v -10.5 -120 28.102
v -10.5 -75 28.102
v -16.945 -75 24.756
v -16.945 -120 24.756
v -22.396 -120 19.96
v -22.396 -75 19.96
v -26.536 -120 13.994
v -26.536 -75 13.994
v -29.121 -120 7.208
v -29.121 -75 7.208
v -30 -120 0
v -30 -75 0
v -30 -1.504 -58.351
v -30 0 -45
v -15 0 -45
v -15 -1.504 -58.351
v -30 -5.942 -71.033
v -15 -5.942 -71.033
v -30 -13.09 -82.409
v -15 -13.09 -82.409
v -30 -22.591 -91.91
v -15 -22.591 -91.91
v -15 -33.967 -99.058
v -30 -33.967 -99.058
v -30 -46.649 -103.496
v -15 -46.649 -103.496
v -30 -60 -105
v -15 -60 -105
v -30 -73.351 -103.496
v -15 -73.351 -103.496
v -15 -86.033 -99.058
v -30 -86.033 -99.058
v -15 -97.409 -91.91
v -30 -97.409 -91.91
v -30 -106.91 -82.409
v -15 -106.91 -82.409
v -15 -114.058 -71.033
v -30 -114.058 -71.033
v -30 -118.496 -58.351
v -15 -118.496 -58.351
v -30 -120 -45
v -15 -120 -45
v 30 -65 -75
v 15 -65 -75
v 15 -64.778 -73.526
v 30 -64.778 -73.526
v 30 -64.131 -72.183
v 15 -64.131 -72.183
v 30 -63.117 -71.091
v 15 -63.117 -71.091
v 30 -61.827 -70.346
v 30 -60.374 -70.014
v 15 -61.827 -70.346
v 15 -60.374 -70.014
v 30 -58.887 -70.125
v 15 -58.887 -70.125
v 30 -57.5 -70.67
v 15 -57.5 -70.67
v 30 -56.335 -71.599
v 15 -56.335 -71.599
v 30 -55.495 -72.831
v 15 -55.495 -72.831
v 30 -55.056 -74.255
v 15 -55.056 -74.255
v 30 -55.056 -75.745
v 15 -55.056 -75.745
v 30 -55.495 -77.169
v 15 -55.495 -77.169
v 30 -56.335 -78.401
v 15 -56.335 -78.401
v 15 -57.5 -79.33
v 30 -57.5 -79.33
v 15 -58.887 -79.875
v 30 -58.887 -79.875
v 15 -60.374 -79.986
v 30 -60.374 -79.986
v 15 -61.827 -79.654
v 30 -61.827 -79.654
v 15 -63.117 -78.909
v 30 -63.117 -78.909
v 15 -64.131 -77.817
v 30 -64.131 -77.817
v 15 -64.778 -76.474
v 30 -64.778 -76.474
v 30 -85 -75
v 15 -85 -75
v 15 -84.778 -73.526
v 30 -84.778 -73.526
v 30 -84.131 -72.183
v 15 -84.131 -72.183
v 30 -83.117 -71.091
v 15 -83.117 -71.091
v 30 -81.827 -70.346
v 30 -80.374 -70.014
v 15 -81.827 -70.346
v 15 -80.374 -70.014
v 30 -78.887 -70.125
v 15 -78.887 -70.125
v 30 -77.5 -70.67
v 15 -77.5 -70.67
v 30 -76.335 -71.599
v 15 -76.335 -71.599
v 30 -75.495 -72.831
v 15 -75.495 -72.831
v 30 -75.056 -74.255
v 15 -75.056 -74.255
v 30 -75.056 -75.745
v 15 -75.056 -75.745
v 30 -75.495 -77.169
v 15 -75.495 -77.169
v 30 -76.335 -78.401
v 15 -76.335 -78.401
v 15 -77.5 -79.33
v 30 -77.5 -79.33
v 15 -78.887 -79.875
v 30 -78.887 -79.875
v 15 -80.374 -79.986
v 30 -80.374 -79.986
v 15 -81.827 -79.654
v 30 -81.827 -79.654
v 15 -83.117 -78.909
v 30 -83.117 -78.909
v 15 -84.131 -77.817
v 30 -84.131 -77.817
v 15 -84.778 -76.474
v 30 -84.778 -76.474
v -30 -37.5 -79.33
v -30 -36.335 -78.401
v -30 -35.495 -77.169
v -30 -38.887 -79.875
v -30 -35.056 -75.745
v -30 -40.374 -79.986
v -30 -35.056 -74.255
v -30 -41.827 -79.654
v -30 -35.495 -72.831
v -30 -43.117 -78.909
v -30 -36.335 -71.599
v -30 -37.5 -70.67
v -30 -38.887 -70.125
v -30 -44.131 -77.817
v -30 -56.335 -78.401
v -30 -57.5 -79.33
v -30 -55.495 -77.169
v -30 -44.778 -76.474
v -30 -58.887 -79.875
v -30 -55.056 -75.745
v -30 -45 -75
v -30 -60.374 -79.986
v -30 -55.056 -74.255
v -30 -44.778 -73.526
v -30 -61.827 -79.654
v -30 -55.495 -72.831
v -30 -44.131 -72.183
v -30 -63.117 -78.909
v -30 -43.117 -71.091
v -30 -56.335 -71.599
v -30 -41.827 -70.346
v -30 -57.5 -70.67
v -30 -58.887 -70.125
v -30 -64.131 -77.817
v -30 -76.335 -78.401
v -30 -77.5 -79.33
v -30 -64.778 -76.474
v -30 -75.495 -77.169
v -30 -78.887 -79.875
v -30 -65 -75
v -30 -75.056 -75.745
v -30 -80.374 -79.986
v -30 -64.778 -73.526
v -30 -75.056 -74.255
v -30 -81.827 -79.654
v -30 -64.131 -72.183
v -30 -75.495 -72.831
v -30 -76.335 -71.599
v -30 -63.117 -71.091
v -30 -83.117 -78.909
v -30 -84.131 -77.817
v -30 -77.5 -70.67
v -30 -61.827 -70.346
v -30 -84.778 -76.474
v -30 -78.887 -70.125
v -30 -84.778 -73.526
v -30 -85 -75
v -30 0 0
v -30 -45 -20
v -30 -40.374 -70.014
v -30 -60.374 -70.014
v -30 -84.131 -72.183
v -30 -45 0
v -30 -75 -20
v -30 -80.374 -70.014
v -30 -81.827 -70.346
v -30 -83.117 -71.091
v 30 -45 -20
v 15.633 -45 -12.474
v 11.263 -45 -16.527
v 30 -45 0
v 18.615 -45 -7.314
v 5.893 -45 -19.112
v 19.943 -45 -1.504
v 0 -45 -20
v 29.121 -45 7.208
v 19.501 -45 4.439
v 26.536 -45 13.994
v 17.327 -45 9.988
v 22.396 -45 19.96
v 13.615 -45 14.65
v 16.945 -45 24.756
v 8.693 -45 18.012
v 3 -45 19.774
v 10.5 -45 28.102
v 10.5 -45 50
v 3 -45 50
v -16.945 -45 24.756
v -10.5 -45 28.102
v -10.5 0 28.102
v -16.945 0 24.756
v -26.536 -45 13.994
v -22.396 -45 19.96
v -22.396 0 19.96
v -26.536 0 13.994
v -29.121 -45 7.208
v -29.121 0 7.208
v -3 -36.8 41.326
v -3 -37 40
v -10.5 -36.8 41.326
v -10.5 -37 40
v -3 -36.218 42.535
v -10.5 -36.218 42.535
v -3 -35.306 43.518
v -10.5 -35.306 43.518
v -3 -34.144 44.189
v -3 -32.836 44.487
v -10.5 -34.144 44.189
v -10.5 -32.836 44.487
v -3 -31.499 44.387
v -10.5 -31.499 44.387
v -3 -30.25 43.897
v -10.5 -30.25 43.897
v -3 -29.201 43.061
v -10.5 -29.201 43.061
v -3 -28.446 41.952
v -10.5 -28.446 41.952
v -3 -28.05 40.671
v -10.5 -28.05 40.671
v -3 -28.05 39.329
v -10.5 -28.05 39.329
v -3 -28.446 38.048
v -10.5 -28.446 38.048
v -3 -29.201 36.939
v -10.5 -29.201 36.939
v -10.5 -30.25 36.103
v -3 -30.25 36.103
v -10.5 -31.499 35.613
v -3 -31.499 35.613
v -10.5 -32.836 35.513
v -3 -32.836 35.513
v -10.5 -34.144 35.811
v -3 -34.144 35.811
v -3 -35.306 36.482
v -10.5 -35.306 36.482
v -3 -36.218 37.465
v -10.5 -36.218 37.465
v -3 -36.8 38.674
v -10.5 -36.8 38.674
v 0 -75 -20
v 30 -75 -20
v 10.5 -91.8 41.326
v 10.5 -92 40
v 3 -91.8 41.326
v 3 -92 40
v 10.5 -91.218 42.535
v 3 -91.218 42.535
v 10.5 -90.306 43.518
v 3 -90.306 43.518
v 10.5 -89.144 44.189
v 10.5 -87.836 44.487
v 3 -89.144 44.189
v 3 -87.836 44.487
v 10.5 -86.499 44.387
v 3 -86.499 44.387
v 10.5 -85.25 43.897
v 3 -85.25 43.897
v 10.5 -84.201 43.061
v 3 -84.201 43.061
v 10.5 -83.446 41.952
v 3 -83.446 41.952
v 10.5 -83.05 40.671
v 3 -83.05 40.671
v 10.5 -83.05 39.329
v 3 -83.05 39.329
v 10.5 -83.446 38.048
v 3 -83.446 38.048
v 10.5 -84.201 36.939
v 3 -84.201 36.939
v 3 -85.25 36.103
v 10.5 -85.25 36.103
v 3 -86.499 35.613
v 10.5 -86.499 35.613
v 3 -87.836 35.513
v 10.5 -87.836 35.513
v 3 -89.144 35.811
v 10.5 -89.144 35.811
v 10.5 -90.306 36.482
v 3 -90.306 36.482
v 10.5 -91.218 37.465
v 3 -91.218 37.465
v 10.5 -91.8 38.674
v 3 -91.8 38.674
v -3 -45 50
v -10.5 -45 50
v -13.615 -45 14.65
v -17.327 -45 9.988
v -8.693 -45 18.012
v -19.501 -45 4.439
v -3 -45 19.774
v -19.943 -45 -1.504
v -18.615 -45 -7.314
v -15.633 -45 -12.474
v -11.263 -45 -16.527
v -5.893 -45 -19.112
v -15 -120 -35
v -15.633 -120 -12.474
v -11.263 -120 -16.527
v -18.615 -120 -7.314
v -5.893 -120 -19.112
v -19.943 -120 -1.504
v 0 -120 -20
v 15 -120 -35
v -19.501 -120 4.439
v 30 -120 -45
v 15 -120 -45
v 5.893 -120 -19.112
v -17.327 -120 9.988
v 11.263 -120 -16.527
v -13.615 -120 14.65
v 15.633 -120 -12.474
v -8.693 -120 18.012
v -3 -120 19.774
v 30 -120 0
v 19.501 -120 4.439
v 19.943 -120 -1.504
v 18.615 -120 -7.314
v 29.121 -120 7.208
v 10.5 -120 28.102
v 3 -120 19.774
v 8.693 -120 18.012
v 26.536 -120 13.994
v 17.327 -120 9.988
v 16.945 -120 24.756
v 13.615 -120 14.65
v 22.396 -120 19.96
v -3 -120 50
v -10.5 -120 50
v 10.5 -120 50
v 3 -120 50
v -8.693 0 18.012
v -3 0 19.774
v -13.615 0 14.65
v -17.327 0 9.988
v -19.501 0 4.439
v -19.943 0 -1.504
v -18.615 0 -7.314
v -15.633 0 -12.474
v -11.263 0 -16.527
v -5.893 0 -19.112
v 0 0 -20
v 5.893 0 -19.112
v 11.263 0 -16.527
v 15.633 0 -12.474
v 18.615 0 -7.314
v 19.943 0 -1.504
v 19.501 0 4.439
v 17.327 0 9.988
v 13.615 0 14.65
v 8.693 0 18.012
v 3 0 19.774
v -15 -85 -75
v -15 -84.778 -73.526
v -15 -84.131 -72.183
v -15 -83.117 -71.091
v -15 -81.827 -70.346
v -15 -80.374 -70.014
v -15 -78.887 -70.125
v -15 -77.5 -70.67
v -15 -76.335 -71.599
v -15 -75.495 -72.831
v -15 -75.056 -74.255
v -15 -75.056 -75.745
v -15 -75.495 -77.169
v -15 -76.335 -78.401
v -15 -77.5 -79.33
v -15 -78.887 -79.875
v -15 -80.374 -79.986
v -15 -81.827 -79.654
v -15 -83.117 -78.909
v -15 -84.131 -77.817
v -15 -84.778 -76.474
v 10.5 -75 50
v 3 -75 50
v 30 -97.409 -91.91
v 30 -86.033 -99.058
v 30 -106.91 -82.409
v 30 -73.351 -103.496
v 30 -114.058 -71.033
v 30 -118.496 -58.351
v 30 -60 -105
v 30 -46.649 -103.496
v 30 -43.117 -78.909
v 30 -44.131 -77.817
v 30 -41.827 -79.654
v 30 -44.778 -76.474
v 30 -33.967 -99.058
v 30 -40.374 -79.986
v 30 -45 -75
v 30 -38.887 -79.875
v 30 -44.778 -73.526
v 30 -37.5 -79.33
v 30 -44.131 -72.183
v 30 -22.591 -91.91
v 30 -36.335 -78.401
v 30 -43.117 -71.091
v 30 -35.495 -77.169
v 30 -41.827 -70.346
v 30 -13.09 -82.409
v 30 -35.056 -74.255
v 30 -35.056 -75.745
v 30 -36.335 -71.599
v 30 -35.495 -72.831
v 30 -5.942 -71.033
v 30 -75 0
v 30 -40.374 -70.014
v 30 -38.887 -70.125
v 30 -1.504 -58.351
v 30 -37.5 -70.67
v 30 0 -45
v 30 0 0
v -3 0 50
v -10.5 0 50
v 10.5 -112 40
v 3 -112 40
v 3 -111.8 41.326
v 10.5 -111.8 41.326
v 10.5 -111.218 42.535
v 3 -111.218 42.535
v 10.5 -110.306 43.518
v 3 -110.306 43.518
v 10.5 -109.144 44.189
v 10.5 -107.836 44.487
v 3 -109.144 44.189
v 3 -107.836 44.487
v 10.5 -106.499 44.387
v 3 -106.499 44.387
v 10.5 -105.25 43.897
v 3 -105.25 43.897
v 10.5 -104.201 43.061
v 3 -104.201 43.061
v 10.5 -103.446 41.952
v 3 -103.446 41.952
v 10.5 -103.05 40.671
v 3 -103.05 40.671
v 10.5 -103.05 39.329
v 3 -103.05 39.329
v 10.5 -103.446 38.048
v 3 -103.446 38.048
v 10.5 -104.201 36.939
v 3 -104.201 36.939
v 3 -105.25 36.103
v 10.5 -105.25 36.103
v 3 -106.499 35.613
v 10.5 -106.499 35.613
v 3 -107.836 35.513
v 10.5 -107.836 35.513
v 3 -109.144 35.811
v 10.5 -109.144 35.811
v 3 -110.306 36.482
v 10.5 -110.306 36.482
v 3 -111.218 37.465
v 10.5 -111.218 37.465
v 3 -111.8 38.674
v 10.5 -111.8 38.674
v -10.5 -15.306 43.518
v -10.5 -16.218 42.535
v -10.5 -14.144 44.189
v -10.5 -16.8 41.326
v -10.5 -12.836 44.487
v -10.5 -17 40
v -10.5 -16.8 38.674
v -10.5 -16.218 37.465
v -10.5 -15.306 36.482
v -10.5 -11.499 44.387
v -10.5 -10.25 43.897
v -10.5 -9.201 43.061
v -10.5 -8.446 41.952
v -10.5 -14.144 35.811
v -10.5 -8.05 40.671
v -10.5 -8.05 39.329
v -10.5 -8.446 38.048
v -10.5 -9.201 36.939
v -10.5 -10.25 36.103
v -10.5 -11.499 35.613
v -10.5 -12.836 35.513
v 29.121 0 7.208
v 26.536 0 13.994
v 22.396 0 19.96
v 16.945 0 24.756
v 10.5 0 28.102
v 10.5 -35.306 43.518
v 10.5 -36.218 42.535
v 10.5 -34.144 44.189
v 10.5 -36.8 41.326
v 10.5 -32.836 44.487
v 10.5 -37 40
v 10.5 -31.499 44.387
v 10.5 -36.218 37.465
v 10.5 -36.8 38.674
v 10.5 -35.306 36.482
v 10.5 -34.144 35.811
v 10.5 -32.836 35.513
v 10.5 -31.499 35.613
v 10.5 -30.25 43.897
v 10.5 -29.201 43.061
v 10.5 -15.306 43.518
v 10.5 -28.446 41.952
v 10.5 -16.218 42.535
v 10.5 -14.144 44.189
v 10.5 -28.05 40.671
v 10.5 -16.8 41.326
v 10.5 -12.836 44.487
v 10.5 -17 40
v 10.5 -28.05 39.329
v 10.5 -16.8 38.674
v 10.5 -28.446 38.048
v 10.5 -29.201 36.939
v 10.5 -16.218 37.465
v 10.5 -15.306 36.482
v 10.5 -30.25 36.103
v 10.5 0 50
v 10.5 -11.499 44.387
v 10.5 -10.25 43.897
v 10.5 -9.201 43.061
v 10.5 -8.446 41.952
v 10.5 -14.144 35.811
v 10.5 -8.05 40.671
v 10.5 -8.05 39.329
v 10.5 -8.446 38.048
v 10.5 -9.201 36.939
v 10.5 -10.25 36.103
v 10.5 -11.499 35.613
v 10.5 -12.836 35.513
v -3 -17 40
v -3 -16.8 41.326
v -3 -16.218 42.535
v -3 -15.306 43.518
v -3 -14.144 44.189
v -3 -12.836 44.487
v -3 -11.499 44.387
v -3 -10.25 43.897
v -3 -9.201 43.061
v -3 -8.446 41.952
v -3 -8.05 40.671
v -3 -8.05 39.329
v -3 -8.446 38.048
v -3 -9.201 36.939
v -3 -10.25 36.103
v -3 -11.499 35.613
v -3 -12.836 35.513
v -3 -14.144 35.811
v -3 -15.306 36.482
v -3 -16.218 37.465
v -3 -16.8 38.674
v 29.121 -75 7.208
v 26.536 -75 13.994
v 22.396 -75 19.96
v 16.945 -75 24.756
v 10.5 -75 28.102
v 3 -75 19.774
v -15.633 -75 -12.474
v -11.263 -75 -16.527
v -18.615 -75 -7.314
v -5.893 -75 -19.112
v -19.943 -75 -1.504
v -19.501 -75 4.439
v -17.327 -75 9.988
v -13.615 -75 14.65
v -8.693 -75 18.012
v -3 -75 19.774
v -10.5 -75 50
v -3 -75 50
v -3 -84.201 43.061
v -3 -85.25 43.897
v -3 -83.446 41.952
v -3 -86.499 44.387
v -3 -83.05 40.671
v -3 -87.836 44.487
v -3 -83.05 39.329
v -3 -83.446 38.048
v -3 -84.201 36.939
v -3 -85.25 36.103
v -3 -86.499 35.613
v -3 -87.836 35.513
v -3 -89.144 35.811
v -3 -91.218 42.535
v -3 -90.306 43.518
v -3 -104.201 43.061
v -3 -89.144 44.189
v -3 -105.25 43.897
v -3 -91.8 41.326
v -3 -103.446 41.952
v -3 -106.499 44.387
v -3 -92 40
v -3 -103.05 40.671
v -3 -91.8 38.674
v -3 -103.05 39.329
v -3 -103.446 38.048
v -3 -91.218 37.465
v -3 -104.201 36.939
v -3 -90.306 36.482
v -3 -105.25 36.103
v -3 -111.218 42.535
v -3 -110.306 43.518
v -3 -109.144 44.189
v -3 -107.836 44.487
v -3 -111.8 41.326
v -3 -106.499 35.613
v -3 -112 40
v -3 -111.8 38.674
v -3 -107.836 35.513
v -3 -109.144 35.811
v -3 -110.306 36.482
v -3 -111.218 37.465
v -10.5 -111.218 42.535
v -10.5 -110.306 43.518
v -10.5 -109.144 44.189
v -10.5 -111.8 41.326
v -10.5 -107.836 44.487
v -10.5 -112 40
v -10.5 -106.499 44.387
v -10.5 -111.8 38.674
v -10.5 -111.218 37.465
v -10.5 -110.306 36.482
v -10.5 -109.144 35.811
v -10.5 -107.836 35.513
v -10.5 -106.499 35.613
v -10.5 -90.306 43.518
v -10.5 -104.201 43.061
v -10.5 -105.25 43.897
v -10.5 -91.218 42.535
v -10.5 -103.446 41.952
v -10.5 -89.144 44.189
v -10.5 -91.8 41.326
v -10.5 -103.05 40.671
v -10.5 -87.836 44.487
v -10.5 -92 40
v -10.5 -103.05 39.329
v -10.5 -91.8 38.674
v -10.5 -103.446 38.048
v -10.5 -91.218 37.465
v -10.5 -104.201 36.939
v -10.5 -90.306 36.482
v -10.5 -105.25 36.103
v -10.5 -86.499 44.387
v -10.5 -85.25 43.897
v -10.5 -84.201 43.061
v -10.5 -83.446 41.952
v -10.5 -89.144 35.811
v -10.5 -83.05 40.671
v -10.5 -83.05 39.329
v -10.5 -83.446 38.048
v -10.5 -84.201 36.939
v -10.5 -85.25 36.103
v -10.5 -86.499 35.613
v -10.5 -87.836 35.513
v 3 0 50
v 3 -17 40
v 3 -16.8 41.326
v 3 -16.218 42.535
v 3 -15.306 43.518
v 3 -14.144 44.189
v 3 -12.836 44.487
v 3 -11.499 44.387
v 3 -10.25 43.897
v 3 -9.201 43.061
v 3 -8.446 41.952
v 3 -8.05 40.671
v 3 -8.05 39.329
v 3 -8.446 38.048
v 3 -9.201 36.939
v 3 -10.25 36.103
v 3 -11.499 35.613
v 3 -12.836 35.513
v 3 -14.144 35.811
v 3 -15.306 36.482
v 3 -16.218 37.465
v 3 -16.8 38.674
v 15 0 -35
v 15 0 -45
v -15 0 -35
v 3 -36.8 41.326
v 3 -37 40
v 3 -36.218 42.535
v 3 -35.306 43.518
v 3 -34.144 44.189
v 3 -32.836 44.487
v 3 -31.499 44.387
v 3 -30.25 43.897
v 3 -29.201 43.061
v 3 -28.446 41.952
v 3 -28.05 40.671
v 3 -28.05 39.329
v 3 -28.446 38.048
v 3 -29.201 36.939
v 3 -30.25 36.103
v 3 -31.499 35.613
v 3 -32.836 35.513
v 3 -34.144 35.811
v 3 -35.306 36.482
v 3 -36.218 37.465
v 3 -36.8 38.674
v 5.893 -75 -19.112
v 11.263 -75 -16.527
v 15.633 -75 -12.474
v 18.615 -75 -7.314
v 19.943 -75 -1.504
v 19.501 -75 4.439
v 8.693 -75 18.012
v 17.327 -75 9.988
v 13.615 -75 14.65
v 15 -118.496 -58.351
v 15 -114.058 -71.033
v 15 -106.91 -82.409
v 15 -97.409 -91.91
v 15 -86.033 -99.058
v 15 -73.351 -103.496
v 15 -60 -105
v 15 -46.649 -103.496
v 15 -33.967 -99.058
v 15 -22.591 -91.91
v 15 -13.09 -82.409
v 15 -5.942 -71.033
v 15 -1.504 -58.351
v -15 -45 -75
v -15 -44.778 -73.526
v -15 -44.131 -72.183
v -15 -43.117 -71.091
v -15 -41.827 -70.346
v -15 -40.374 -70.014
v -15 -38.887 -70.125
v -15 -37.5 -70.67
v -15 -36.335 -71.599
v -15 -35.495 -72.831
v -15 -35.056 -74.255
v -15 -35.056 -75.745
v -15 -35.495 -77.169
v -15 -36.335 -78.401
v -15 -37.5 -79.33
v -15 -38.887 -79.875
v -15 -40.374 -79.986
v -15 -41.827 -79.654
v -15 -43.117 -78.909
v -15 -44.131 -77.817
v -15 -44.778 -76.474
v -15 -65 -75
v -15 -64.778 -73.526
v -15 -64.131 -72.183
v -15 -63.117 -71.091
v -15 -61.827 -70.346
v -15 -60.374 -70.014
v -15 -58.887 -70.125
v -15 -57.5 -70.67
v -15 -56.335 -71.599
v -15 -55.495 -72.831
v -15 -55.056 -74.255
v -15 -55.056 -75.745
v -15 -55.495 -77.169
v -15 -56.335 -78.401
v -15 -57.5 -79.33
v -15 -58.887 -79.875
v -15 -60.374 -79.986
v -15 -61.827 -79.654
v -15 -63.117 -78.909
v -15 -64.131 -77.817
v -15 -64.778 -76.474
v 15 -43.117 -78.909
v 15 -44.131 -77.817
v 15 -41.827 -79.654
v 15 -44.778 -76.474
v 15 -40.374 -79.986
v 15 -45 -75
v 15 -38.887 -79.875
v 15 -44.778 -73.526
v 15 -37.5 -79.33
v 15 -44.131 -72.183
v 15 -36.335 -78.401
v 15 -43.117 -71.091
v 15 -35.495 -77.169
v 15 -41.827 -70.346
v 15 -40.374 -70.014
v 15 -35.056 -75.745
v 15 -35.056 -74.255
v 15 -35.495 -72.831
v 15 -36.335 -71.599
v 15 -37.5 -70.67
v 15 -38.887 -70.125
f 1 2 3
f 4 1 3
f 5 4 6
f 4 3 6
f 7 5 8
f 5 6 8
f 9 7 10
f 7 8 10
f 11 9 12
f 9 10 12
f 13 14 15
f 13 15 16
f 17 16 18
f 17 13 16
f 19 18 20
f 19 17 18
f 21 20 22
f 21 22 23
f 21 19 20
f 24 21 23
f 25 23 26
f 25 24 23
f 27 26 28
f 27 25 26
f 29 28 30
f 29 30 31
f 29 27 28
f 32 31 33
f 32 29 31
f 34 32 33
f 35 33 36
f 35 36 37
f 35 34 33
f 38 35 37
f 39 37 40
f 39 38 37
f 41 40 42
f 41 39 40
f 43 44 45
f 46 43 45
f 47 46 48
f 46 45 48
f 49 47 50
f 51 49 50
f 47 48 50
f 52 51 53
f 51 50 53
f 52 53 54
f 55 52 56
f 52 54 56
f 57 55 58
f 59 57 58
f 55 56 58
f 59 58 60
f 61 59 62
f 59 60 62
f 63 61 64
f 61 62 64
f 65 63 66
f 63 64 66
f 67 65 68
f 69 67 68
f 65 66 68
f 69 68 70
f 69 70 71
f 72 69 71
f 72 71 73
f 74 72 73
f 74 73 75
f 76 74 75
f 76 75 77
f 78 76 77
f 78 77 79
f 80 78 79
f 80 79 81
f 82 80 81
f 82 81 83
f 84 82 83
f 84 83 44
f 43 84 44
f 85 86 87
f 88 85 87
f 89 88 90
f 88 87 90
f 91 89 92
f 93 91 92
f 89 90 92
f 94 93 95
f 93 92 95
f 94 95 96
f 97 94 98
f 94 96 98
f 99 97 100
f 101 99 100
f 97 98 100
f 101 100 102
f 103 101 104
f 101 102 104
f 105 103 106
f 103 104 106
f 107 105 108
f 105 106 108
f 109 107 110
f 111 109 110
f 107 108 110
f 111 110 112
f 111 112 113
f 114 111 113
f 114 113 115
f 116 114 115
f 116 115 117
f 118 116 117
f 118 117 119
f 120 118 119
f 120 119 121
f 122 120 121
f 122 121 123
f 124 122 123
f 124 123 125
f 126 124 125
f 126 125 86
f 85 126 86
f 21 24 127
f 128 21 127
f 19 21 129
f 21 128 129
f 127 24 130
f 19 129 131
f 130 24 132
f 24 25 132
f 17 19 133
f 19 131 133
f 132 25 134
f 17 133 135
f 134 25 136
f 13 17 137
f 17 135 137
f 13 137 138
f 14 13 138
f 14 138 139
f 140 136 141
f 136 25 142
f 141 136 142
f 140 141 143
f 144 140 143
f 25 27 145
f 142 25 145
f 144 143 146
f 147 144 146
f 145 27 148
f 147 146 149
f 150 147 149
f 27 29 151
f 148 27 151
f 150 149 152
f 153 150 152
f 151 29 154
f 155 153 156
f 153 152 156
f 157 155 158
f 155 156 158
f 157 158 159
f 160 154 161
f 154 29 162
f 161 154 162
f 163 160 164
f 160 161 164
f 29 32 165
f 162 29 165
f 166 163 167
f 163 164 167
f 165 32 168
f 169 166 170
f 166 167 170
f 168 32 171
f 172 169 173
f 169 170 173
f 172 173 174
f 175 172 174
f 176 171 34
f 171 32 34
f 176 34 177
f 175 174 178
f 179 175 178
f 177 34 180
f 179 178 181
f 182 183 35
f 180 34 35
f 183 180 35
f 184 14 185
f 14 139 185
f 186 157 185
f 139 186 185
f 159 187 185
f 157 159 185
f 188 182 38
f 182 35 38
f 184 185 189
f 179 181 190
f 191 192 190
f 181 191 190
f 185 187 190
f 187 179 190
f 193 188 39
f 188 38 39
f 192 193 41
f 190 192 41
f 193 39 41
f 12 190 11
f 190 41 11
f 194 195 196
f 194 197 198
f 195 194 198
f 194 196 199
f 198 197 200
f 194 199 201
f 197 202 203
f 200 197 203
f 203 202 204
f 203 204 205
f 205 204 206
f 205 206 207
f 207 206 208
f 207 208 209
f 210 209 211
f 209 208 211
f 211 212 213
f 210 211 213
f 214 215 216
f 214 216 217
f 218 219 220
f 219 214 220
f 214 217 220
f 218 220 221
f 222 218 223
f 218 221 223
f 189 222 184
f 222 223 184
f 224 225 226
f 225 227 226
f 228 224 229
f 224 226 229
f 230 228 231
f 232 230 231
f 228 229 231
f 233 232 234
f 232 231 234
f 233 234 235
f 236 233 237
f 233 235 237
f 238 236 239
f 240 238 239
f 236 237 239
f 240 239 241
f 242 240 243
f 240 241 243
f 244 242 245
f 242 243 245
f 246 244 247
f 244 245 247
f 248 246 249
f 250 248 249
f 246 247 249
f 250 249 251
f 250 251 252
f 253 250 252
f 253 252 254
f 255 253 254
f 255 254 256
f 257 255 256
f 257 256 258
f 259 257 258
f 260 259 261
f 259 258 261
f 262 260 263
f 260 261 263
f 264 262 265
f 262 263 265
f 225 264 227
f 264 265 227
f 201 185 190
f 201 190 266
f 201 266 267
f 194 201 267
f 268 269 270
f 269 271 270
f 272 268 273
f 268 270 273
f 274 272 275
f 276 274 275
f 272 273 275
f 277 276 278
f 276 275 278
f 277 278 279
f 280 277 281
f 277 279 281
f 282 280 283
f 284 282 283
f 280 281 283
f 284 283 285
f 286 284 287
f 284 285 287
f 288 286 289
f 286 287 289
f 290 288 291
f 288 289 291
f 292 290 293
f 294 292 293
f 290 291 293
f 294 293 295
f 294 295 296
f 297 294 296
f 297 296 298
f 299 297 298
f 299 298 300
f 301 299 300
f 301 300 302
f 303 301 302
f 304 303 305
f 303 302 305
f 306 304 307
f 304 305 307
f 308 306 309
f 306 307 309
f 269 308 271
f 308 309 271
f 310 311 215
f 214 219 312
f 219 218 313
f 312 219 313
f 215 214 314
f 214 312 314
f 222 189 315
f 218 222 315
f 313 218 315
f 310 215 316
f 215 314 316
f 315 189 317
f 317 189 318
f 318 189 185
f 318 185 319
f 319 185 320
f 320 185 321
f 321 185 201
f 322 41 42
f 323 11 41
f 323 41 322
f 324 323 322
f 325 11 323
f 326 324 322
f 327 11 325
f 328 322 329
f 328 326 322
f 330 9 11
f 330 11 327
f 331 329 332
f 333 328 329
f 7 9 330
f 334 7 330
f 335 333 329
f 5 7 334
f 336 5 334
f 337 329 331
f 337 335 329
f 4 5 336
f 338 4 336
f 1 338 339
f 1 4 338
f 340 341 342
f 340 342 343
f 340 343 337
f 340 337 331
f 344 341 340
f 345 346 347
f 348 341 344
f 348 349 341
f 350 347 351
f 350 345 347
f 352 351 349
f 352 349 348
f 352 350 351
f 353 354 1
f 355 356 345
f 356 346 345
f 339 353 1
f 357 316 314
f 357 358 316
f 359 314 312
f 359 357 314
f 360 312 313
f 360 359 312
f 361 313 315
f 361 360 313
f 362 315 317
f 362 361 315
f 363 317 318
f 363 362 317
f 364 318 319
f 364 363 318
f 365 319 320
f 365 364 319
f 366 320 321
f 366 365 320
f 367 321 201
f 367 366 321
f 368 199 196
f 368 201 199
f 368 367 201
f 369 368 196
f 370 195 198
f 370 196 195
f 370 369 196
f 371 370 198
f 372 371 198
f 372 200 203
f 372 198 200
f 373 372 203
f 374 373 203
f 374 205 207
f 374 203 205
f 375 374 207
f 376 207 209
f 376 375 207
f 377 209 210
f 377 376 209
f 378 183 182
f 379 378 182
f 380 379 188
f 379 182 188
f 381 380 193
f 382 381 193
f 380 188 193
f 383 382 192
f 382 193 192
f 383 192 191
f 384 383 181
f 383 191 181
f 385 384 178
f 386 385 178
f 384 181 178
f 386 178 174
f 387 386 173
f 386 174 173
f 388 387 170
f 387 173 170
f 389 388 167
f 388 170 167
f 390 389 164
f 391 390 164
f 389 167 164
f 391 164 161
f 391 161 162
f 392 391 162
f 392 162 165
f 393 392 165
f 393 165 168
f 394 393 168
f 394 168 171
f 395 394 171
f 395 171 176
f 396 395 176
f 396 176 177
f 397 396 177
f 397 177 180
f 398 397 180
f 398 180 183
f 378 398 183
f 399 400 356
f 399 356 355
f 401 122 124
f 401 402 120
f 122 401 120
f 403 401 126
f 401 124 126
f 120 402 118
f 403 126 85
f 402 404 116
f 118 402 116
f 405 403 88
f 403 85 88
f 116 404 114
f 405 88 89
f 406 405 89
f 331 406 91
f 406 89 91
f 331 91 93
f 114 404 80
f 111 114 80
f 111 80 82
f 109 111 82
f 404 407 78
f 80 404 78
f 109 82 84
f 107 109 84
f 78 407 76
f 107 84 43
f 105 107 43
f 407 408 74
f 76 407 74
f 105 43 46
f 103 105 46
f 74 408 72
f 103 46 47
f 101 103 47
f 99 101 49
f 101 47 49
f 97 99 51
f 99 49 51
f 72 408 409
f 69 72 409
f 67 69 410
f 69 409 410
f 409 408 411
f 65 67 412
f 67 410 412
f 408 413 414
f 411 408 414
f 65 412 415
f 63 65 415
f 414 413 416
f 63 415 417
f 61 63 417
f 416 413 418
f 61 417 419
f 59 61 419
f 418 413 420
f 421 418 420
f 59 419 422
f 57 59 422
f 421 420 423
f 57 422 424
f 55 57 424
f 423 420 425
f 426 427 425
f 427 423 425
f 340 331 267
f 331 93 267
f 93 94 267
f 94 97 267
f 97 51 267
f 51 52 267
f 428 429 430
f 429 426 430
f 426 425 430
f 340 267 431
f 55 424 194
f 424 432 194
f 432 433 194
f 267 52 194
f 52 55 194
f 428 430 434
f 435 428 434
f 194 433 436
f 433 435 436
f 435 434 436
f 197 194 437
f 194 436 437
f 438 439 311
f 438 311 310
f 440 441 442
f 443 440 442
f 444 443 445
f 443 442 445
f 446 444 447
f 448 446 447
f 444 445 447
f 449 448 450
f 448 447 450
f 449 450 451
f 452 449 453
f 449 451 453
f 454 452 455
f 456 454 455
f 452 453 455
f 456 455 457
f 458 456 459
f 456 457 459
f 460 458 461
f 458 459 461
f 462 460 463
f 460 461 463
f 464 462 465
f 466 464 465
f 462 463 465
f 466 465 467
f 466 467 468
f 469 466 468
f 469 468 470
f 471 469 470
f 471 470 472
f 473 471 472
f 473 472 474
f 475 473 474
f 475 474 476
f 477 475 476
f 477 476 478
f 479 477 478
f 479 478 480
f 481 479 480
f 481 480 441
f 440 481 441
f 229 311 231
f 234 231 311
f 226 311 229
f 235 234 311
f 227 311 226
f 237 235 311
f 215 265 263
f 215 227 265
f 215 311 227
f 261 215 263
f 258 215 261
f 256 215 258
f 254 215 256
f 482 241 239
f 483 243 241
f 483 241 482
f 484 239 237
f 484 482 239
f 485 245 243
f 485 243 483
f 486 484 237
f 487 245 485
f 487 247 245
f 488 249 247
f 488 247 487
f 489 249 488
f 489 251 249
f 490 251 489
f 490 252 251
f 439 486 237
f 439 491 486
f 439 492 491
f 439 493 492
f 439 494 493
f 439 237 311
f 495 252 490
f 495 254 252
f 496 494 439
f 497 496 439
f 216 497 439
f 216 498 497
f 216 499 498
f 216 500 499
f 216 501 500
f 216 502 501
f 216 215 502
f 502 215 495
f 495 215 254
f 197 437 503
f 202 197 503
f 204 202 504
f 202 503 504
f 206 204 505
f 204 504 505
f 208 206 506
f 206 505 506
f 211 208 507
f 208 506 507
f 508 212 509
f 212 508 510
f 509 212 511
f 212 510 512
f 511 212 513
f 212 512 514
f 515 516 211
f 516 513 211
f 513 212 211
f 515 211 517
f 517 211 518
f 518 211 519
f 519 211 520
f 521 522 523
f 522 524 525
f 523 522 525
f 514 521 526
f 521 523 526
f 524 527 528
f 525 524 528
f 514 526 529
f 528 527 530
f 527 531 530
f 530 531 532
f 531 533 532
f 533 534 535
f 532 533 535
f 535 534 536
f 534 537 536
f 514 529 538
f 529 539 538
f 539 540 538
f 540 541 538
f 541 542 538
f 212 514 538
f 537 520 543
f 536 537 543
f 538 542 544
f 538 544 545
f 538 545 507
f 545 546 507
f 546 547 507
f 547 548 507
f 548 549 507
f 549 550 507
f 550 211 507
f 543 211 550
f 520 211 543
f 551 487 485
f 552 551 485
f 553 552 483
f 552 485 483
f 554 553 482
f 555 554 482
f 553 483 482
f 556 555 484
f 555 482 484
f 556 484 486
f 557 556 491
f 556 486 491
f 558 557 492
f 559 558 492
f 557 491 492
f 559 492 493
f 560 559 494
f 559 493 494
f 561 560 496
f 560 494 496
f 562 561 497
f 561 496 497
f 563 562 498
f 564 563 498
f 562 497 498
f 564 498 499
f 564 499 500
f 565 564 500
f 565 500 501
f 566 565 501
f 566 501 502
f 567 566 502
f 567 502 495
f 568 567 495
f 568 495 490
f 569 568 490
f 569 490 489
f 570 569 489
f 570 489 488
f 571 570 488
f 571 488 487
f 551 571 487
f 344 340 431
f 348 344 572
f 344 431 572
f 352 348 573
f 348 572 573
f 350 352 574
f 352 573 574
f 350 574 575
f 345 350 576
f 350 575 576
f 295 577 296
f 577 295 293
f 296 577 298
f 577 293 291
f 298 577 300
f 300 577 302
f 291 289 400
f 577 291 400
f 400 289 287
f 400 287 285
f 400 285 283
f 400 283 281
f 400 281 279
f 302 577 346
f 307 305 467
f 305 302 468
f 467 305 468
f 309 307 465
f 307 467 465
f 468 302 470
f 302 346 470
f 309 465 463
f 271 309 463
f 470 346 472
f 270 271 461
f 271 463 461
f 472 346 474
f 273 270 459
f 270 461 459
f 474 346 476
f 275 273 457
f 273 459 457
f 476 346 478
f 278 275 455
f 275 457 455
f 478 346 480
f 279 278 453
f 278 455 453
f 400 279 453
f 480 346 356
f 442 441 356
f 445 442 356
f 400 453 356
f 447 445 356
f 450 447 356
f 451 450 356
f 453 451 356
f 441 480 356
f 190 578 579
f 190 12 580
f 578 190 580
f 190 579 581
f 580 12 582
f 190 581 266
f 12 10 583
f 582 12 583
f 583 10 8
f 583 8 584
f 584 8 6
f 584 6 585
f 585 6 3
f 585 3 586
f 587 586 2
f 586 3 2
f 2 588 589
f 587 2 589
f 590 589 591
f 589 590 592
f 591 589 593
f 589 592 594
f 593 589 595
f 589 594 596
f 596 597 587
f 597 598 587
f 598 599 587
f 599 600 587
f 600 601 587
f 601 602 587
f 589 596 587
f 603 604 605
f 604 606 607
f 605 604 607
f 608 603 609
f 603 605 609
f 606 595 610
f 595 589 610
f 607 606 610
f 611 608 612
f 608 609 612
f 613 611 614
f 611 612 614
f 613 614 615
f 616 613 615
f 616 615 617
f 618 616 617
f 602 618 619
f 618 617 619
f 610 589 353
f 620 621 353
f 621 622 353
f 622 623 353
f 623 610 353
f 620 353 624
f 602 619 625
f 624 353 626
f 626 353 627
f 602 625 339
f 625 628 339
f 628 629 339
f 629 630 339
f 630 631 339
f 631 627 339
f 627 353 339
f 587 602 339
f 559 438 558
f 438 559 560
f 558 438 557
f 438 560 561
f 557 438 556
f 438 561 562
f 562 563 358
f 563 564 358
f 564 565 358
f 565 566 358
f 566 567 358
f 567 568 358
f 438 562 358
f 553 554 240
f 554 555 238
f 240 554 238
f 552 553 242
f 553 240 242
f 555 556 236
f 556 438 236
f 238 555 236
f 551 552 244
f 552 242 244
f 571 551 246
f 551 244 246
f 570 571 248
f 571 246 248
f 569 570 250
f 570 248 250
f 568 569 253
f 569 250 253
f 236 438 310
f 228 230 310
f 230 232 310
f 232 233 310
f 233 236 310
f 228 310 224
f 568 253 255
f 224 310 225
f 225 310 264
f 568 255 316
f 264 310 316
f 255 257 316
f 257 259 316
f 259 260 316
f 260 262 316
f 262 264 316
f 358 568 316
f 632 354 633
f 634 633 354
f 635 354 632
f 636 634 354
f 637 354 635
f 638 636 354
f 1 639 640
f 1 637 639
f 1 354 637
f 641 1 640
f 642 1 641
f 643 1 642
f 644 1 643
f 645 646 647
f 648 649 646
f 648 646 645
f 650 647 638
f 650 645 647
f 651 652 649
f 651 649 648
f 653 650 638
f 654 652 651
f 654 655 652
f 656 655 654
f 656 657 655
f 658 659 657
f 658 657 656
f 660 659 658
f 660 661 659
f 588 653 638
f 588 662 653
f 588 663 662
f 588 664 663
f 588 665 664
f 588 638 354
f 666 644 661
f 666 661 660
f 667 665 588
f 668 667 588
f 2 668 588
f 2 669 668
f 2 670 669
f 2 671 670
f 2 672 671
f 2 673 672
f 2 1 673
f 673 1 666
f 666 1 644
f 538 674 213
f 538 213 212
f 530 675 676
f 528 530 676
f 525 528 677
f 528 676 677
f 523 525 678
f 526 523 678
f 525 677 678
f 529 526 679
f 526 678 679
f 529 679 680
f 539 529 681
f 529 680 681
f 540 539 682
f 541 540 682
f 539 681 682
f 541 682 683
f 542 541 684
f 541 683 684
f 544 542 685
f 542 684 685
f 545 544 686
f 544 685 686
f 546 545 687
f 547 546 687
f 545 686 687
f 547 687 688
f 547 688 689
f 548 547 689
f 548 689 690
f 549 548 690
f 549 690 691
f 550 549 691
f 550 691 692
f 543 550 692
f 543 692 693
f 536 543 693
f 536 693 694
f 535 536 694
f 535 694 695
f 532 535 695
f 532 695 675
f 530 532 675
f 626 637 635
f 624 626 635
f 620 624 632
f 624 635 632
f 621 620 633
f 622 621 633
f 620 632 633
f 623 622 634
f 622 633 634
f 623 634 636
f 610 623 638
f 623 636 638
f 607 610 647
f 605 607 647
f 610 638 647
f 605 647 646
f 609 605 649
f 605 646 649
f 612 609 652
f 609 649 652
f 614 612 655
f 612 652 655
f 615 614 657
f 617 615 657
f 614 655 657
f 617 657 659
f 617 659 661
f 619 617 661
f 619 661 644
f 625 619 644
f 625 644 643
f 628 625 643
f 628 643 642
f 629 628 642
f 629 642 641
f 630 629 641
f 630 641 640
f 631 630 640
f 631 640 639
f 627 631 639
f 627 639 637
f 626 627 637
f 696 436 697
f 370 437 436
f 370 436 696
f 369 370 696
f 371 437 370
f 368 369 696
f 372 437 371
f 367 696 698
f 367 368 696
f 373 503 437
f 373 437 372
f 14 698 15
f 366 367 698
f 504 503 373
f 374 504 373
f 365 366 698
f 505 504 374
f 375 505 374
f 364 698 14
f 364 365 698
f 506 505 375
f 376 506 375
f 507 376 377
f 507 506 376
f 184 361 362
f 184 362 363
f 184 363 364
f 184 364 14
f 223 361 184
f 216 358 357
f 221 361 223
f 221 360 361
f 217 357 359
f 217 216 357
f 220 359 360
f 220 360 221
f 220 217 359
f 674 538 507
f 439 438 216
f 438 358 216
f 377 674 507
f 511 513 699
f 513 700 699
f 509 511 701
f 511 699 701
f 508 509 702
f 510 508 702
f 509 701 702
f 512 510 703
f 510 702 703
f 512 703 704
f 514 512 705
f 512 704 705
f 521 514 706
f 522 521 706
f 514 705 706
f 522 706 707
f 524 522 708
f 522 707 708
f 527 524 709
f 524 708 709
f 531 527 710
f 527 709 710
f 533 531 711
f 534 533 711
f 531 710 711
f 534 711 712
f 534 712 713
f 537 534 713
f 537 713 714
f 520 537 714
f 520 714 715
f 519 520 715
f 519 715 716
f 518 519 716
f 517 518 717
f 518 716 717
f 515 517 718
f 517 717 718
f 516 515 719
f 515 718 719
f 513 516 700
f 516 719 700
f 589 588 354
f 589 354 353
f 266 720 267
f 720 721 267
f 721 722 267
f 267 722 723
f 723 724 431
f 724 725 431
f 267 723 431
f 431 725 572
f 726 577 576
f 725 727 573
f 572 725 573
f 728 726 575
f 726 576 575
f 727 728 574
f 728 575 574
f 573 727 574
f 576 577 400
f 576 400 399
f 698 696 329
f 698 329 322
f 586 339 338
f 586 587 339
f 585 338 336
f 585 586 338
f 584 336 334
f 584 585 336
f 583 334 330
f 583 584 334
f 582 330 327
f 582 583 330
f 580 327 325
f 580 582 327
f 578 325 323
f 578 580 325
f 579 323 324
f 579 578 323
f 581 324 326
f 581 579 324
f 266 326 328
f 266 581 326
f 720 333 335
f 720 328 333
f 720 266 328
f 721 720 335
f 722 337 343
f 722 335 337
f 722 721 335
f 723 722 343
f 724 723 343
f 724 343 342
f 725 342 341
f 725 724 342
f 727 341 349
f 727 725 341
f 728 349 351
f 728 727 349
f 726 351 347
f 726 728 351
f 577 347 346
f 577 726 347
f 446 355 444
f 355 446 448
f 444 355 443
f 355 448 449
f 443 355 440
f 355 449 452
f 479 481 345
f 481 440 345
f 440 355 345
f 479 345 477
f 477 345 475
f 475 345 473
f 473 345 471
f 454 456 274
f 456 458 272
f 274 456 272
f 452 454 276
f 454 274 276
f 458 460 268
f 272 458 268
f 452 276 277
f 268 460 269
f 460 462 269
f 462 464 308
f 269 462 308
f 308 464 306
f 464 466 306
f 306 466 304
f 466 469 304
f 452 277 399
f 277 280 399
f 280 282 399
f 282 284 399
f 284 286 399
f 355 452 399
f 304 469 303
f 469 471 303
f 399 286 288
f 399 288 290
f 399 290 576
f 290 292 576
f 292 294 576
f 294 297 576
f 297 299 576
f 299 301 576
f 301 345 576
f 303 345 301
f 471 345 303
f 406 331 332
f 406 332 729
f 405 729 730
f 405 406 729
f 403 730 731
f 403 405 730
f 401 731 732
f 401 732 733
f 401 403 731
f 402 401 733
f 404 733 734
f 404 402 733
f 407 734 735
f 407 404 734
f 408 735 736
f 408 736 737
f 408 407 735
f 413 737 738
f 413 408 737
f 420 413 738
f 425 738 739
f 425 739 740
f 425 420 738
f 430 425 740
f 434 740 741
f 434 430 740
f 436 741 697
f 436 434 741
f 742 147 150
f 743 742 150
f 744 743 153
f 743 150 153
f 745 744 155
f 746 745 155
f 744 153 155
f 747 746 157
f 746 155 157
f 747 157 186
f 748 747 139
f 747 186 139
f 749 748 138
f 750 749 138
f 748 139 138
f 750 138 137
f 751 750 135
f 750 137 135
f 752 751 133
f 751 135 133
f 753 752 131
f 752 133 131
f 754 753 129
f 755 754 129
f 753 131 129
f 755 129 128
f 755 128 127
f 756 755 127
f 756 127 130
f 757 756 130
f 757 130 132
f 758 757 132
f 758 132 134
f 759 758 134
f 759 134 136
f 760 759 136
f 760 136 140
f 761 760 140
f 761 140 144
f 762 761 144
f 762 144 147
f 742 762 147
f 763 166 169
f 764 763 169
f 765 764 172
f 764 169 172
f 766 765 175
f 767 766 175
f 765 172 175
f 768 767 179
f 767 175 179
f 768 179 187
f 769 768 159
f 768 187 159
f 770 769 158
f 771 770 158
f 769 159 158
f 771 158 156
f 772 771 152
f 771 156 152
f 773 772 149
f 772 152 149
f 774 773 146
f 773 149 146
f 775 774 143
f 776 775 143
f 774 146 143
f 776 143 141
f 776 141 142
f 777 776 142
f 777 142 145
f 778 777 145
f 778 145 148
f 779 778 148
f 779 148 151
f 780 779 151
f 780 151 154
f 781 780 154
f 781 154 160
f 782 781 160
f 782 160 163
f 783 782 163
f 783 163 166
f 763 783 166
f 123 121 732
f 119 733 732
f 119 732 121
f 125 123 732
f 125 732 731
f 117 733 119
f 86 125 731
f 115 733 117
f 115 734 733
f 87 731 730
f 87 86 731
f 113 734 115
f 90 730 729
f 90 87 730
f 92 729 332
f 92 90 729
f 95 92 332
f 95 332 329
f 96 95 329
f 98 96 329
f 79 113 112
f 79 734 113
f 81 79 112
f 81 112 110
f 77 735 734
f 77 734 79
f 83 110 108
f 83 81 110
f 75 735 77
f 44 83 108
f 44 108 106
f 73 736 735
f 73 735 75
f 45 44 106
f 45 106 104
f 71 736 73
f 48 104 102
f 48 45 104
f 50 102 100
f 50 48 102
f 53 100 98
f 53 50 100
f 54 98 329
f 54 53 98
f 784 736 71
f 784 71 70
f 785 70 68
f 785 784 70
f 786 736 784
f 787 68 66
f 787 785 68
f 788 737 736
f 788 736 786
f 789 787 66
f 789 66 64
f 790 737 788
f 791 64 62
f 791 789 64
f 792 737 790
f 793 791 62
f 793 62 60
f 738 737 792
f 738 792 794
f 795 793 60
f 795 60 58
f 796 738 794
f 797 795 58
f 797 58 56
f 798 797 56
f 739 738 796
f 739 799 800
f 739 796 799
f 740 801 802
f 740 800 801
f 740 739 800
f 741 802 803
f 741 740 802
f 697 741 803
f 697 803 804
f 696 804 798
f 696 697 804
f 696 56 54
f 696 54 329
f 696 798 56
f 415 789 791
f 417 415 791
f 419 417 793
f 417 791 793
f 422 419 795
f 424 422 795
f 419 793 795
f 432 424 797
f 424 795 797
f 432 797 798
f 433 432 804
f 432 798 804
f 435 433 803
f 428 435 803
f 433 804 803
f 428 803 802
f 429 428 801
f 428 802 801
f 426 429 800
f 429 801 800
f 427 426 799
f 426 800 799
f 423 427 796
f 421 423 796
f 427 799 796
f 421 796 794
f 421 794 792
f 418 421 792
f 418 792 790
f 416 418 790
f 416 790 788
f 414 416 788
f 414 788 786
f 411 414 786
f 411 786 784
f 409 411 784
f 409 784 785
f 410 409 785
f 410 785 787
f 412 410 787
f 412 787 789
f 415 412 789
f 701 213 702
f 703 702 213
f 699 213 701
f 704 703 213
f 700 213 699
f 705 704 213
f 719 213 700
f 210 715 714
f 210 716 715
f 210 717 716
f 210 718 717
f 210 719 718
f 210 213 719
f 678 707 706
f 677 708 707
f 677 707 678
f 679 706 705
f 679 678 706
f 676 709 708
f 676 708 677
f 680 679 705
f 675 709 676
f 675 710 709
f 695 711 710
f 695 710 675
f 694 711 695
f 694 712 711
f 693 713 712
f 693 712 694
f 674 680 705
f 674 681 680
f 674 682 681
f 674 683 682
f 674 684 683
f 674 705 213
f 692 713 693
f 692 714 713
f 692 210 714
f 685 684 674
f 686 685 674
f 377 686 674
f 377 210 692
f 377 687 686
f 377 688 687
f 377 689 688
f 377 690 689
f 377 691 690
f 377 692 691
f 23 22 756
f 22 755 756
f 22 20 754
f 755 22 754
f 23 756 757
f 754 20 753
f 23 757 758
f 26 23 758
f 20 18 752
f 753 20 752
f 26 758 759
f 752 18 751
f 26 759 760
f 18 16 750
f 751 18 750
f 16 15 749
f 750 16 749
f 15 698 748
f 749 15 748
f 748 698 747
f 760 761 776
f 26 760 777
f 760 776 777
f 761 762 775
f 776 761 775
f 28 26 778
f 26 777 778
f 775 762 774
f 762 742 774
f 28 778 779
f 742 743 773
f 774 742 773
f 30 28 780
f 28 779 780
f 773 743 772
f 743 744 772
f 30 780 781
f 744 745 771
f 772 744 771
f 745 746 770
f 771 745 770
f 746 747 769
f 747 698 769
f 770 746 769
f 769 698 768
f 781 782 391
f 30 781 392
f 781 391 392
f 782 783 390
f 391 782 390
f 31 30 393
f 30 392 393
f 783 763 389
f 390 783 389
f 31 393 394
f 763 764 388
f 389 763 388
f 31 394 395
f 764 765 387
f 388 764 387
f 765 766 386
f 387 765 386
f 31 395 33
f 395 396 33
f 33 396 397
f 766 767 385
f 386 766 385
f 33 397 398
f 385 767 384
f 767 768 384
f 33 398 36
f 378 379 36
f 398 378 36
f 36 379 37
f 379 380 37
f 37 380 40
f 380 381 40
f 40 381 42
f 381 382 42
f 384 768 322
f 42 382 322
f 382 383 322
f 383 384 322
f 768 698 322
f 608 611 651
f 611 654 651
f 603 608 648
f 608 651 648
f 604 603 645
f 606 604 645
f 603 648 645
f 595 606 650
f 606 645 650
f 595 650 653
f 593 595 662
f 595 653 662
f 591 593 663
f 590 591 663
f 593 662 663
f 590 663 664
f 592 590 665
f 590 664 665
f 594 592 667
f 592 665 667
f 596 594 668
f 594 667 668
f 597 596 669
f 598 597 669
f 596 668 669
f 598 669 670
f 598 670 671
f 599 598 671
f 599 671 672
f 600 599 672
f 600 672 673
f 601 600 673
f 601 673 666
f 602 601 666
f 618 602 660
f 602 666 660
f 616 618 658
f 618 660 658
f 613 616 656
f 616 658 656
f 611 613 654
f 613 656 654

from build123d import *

# Parameters (mm, degrees)
F0_R      = 30
F0_R_2    = 20
F1_DEPTH  = 120
F2_DEPTH  = 120
F4_DEPTH  = 120
F5_W      = 120
F5_H      = 30
F6_DEPTH  = 100
F7_W      = 120
F7_H      = 30
F8_DEPTH  = 50
F10_W     = 7.5
F10_H     = 45
F11_DEPTH = 25
F12_DEPTH = 25
F13_DEPTH = 25
F14_DEPTH = 25
F15_R     = 4.5
F16_DEPTH = 50
F17_R     = 4.5
F18_DEPTH = 50
F19_DEPTH = 50
F20_R     = 4.5
F21_DEPTH = 100
F22_DEPTH = 50
F23_R     = 4.5
F24_DEPTH = 50
F25_DEPTH = 100
F27_W     = 60
F27_H     = 120
F28_DEPTH = 25
F30_DEPTH = 15
F32_DEPTH = 15
F33_R     = 5
F34_DEPTH = 60.001
F35_DEPTH = 60.001
F36_DEPTH = 60.001
F37_W     = 30
F37_H     = 10
F38_DEPTH = 120.001
F39_W     = 8
F39_H     = 20
F40_DEPTH = 45
F41_DEPTH = 45
F42_W     = 8
F42_H     = 20
F43_DEPTH = 45
F44_DEPTH = 45


with BuildPart() as f1:
    # F0 (on Front) → F1 (new body)
    with BuildSketch(Plane.XZ):
        Circle(F0_R)
        Circle(F0_R_2, mode=Mode.SUBTRACT)
    extrude(amount=F1_DEPTH)

    # F0 (on Front) → F2 (join)
    with BuildSketch(Plane.XZ):
        Circle(F0_R)
        Circle(F0_R_2, mode=Mode.SUBTRACT)
    extrude(amount=F2_DEPTH)

    # F3 (on face) → F4 (cut)
    with BuildSketch(Plane.XZ.offset(120)):
        with BuildLine():
            ThreePointArc((3, 29.8496231132), (0, 30), (-3, 29.8496231132))
            Line((-3, 29.8496231132), (-3, 19.7737199333))
            ThreePointArc((-3, 19.7737199333), (0, 20), (3, 19.7737199333))
            Line((3, 19.7737199333), (3, 29.8496231132))
        make_face()
    extrude(amount=-F4_DEPTH, mode=Mode.SUBTRACT)

    # F5 (on Top) → F6 (cut)
    with BuildSketch(Plane.XY):
        with Locations((0, -60)):
            Rectangle(F5_W, F5_H)
    extrude(amount=-F6_DEPTH, mode=Mode.SUBTRACT)

    # F7 (on Top) → F8 (cut, symmetric)
    with BuildSketch(Plane.XY):
        with Locations((0, -60)):
            Rectangle(F7_W, F7_H)
    extrude(amount=F8_DEPTH, both=True, mode=Mode.SUBTRACT)

    # F17 (on face) → F18 (cut, symmetric)
    with BuildSketch(Plane.YZ.offset(10.5)):
        with Locations((-107.5, 40)):
            Circle(F17_R)
    extrude(amount=F18_DEPTH, both=True, mode=Mode.SUBTRACT)

    # F17 (on face) → F19 (cut, symmetric)
    with BuildSketch(Plane.YZ.offset(10.5)):
        with Locations((-87.5, 40)):
            Circle(F17_R)
    extrude(amount=F19_DEPTH, both=True, mode=Mode.SUBTRACT)

    # F23 (on face) → F24 (cut, symmetric)
    with BuildSketch(Plane.YZ.offset(10.5)):
        with Locations((-32.5, 40)):
            Circle(F23_R)
    extrude(amount=F24_DEPTH, both=True, mode=Mode.SUBTRACT)

    # F23 (on face) → F25 (cut)
    with BuildSketch(Plane.YZ.offset(10.5)):
        with Locations((-12.5, 40)):
            Circle(F23_R)
    extrude(amount=-F25_DEPTH, mode=Mode.SUBTRACT)



with BuildPart() as f11:
    # F10 (on offset) → F11 (new body)
    with BuildSketch(Plane.XY.offset(25)):
        with Locations((6.75, -22.5)):
            Rectangle(F10_W, F10_H)
    extrude(amount=F11_DEPTH)


with BuildPart() as f12:
    # F10 (on offset) → F12 (new body)
    with BuildSketch(Plane.XY.offset(25)):
        with Locations((-6.75, -22.5)):
            Rectangle(F10_W, F10_H)
    extrude(amount=F12_DEPTH)


with BuildPart() as f13:
    # F10 (on offset) → F13 (new body)
    with BuildSketch(Plane.XY.offset(25)):
        with Locations((-6.75, -97.5)):
            Rectangle(F10_W, F10_H)
    extrude(amount=F13_DEPTH)


with BuildPart() as f14:
    # F10 (on offset) → F14 (new body)
    with BuildSketch(Plane.XY.offset(25)):
        with Locations((6.75, -97.5)):
            Rectangle(F10_W, F10_H)
    extrude(amount=F14_DEPTH)


with BuildPart() as f16_tool:
    # F15 (on face) → F16 (new body, symmetric)
    with BuildSketch(Plane(origin=(-10.5, 0, 0), x_dir=(0, -1, 0), z_dir=(-1, 0, 0))):
        with Locations((107.5, 40)):
            Circle(F15_R)
        with Locations((87.5, 40)):
            Circle(F15_R)
    extrude(amount=F16_DEPTH, both=True)


with BuildPart() as f13_1:
    add(f13.part)

    # F16: cut by f16_tool
    add(f16_tool.part, mode=Mode.SUBTRACT)


with BuildPart() as f14_1:
    add(f14.part)

    # F16: cut by f16_tool
    add(f16_tool.part, mode=Mode.SUBTRACT)


with BuildPart() as f21_tool:
    # F20 (on face) → F21 (new body)
    with BuildSketch(Plane(origin=(-10.5, 0, 0), x_dir=(0, -1, 0), z_dir=(-1, 0, 0))):
        with Locations((12.5, 40)):
            Circle(F20_R)
    extrude(amount=-F21_DEPTH)


with BuildPart() as f11_1:
    add(f11.part)

    # F21: cut by f21_tool
    add(f21_tool.part, mode=Mode.SUBTRACT)


with BuildPart() as f12_1:
    add(f12.part)

    # F21: cut by f21_tool
    add(f21_tool.part, mode=Mode.SUBTRACT)


with BuildPart() as f22_tool:
    # F20 (on face) → F22 (new body, symmetric)
    with BuildSketch(Plane(origin=(-10.5, 0, 0), x_dir=(0, -1, 0), z_dir=(-1, 0, 0))):
        with Locations((32.5, 40)):
            Circle(F20_R)
    extrude(amount=F22_DEPTH, both=True)


with BuildPart() as f11_2:
    add(f11_1.part)

    # F22: cut by f22_tool
    add(f22_tool.part, mode=Mode.SUBTRACT)


with BuildPart() as f12_2:
    add(f12_1.part)

    # F22: cut by f22_tool
    add(f22_tool.part, mode=Mode.SUBTRACT)


with BuildPart() as f28:
    # F27 (on offset) → F28 (new body)
    with BuildSketch(Plane.XY.offset(-20)):
        with Locations((0, -60)):
            Rectangle(F27_W, F27_H)
    extrude(amount=-F28_DEPTH)

    # F29 (on face) → F30 (join)
    with BuildSketch(Plane.YZ.offset(30)):
        with BuildLine():
            Line((0, -45), (-120, -45))
            ThreePointArc((-120, -45), (-60, -105), (0, -45))
        make_face()
    extrude(amount=-F30_DEPTH)

    # F31 (on face) → F32 (join)
    with BuildSketch(Plane(origin=(-30, 0, 0), x_dir=(0, -1, 0), z_dir=(-1, 0, 0))):
        with BuildLine():
            Line((120, -45), (0, -45))
            ThreePointArc((0, -45), (60, -105), (120, -45))
        make_face()
    extrude(amount=-F32_DEPTH)

    # F33 (on face) → F34 (cut, through all)
    with BuildSketch(Plane(origin=(-30, 0, 0), x_dir=(0, -1, 0), z_dir=(-1, 0, 0))):
        with Locations((40, -75)):
            Circle(F33_R)
    extrude(amount=-F34_DEPTH, mode=Mode.SUBTRACT)

    # F33 (on face) → F35 (cut, through all)
    with BuildSketch(Plane(origin=(-30, 0, 0), x_dir=(0, -1, 0), z_dir=(-1, 0, 0))):
        with Locations((60, -75)):
            Circle(F33_R)
    extrude(amount=-F35_DEPTH, mode=Mode.SUBTRACT)

    # F33 (on face) → F36 (cut, through all)
    with BuildSketch(Plane(origin=(-30, 0, 0), x_dir=(0, -1, 0), z_dir=(-1, 0, 0))):
        with Locations((80, -75)):
            Circle(F33_R)
    extrude(amount=-F36_DEPTH, mode=Mode.SUBTRACT)

    # F37 (on face) → F38 (cut, through all)
    with BuildSketch(Plane(origin=(0, 0, 0), x_dir=(-1, 0, 0), z_dir=(0, 1, 0))):
        with Locations((0, -40)):
            Rectangle(F37_W, F37_H)
    extrude(amount=-F38_DEPTH, mode=Mode.SUBTRACT)


with BuildPart() as f40:
    # F39 (on face) → F40 (new body)
    with BuildSketch(Plane(origin=(0, 0, 0), x_dir=(-1, 0, 0), z_dir=(0, 1, 0))):
        with Locations((-26, -10)):
            Rectangle(F39_W, F39_H)
    extrude(amount=-F40_DEPTH)


with BuildPart() as f41:
    # F39 (on face) → F41 (new body)
    with BuildSketch(Plane(origin=(0, 0, 0), x_dir=(-1, 0, 0), z_dir=(0, 1, 0))):
        with Locations((26, -10)):
            Rectangle(F39_W, F39_H)
    extrude(amount=-F41_DEPTH)


with BuildPart() as f1_1:
    add(f1.part)

    add(f11_2.part)  # F43 merges F11

    add(f12_2.part)  # F43 merges F12

    add(f13_1.part)  # F43 merges F13

    add(f14_1.part)  # F43 merges F14

    add(f28.part)  # F43 merges F28

    add(f40.part)  # F43 merges F40

    add(f41.part)  # F43 merges F41
    # F42 (on face) → F43 (join)
    with BuildSketch(Plane.XZ.offset(120)):
        with Locations((-26, -10)):
            Rectangle(F42_W, F42_H)
    extrude(amount=-F43_DEPTH)

    # F42 (on face) → F44 (join)
    with BuildSketch(Plane.XZ.offset(120)):
        with Locations((26, -10)):
            Rectangle(F42_W, F42_H)
    extrude(amount=-F44_DEPTH)


solid = f1_1.part
